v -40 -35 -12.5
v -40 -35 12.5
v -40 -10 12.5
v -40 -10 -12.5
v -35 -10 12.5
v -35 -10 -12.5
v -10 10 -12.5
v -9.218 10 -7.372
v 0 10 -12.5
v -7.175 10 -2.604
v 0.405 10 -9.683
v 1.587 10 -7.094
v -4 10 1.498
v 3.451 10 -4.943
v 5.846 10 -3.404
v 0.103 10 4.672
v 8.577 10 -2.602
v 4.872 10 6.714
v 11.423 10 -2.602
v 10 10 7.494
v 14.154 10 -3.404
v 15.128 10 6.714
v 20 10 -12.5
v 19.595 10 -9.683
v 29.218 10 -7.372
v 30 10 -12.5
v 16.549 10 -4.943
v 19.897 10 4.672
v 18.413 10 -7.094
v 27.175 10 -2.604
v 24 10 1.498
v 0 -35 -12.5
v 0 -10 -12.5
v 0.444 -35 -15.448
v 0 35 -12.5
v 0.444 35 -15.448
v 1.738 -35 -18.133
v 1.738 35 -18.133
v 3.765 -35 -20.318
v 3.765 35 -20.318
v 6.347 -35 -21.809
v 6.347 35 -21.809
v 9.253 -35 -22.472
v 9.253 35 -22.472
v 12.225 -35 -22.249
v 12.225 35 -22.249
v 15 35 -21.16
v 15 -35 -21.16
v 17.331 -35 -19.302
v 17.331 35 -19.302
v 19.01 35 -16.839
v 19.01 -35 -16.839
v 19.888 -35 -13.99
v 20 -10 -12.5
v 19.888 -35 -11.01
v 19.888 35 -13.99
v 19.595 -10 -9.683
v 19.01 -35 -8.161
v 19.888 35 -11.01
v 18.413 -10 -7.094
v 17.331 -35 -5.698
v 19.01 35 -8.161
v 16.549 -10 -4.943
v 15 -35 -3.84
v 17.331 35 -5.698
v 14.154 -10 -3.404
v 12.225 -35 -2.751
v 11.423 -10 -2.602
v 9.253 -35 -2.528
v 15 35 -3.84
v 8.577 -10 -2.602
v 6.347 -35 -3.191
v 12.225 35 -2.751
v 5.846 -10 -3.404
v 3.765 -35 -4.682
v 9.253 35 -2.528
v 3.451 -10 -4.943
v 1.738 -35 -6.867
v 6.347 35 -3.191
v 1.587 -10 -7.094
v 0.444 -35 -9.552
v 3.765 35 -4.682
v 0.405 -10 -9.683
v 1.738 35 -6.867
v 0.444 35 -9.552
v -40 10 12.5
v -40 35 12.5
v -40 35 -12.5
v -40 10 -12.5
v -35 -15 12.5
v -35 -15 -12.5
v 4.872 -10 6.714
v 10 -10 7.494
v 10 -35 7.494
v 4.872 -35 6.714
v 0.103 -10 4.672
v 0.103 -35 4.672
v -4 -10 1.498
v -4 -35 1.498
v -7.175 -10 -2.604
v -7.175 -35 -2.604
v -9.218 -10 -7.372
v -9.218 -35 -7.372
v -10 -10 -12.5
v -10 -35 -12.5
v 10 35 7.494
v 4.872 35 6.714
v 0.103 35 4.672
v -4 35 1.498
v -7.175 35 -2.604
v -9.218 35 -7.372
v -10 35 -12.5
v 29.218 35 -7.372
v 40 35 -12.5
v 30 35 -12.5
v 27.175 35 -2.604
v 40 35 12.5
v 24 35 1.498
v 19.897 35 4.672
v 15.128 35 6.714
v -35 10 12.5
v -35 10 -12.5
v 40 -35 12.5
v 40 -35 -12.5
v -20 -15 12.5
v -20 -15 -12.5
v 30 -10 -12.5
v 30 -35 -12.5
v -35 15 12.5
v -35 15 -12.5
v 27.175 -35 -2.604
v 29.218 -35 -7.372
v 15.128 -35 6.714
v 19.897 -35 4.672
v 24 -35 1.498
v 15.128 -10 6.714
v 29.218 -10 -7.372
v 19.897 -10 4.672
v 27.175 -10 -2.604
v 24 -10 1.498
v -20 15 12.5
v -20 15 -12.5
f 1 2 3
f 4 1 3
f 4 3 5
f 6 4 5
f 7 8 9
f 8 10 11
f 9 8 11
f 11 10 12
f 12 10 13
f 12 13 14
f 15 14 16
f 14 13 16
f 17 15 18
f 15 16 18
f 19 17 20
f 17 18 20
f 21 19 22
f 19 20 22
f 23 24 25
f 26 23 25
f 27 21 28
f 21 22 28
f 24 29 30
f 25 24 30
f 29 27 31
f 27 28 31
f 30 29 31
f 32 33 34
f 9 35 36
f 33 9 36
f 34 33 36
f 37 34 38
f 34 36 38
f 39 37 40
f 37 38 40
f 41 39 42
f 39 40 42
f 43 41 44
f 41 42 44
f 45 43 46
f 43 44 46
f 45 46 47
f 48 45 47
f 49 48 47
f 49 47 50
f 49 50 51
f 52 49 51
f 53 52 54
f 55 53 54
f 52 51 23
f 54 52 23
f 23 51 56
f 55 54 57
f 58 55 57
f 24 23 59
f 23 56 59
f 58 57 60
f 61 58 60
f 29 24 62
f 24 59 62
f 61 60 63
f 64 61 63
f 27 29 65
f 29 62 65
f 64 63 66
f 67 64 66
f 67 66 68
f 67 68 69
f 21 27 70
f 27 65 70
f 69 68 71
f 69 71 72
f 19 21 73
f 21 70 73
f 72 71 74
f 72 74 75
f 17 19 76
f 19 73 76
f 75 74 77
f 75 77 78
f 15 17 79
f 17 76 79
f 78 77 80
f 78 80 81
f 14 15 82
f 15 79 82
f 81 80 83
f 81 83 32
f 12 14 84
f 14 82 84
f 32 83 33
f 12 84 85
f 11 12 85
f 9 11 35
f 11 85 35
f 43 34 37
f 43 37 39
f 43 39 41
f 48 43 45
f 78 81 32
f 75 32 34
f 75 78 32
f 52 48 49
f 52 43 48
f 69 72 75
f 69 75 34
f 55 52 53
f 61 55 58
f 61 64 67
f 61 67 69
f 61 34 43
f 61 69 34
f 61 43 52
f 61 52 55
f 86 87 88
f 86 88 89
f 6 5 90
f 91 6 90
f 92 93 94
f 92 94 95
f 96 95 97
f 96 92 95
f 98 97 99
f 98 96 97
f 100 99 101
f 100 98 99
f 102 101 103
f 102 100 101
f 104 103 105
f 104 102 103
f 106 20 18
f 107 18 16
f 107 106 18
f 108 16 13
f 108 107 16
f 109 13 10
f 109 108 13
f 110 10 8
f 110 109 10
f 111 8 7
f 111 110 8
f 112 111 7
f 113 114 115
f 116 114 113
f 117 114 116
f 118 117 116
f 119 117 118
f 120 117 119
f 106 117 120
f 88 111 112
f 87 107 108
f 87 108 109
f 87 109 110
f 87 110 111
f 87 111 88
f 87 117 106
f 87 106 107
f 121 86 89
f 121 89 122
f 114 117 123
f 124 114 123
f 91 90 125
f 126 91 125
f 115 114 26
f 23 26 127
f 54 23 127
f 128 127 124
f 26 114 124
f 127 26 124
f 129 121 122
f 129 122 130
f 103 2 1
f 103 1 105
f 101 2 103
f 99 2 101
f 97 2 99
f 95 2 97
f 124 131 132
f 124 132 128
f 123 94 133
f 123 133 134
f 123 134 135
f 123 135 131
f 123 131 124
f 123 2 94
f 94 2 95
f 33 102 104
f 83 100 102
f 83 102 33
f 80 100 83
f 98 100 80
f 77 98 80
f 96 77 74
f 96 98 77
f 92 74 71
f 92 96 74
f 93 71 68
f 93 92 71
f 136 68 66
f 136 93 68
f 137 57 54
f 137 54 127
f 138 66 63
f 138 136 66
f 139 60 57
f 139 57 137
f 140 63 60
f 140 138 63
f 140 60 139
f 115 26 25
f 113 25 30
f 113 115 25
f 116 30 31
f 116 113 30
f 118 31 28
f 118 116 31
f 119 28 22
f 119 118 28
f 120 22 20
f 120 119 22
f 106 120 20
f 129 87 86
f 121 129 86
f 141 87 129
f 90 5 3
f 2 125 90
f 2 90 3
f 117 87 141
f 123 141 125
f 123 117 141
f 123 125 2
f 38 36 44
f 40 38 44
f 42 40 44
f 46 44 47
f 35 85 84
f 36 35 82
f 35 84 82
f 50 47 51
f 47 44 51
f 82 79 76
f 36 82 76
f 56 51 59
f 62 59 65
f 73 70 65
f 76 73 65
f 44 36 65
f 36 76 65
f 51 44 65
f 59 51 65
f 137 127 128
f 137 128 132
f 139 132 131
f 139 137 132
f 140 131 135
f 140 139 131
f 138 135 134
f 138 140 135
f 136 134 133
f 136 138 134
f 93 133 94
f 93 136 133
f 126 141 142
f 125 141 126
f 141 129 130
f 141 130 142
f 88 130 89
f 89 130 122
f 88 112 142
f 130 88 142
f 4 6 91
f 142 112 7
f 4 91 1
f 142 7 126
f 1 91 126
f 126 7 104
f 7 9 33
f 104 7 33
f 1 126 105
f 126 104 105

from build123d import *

# Parameters (mm, degrees)
F0_W          = 70
F0_H          = 25
F1_DEPTH      = 40
F1_DEPTH_BACK = 40
F3_DEPTH      = 40
F4_W          = 40
F4_H          = 20
F5_DEPTH      = 25
F7_DEPTH      = 25
F8_W          = 80
F8_H          = 25
F9_DEPTH      = 35
F11_DEPTH     = 25
F12_T4_DEPTH  = 76.2347538298
F12_T9_DEPTH  = 76.2347538298
F12_T14_DEPTH = 76.2347538298
F12_T19_DEPTH = 76.2347538298


# Not quite as in the source:
# - a fillet or chamfer that OpenCascade refuses, or shapes differently, is made with other operations: its cross-section is extruded or revolved along the edge and cut away or added


with BuildPart() as f1:
    # F0 (on Right) → F1 (new body, two sides)
    with BuildSketch(Plane.YZ) as f1_sk:
        Rectangle(F0_W, F0_H)
    extrude(amount=F1_DEPTH)
    extrude(f1_sk.sketch, amount=-F1_DEPTH_BACK)

    # F2 (on face) → F3 (cut)
    with BuildSketch(Plane.XY.offset(12.5)):
        Polygon((-40, 10), (-40, 0), (-20, 0), (-20, 15), (-35, 15), (-35, 10), align=None)
        Polygon((-20, 0), (-40, 0), (-40, -10), (-35, -10), (-35, -15), (-20, -15), align=None)
    extrude(amount=-F3_DEPTH, mode=Mode.SUBTRACT)

    # F4 (on face) → F5 (cut)
    with BuildSketch(Plane.XZ.offset(35)):
        with Locations((10, -2.5)):
            Rectangle(F4_W, F4_H)
    extrude(amount=-F5_DEPTH, mode=Mode.SUBTRACT)

    # F6 (on face) → F7 (join)
    with BuildSketch(Plane.XZ.offset(10)):
        with BuildLine():
            Line((0, -12.5), (20, -12.5))
            ThreePointArc((20, -12.5), (10, -2.5), (0, -12.5))
        make_face()
        with BuildLine():
            ThreePointArc((0, -12.5), (10, -22.5), (20, -12.5))
            Line((20, -12.5), (0, -12.5))
        make_face()
    extrude(amount=F7_DEPTH)

    # F8 (on face) → F9 (cut)
    with BuildSketch(Plane(origin=(0, 35, 0), x_dir=(-1, 0, 0), z_dir=(0, 1, 0))):
        Rectangle(F8_W, F8_H)
    extrude(amount=-F9_DEPTH, mode=Mode.SUBTRACT)

    # F10: F1 across plane


with BuildPart() as f1_1:
    add(f1.part)
    add(f1.part.mirror(Plane.XZ))

    # F11 (add): a face of the model
    f11_faces = [f1_1.faces().sort_by_distance(p)[0] for p in [
        (10, -10, -16.7441318158),
    ]]
    extrude(f11_faces, amount=F11_DEPTH)

    # F12: fillet of radius 20.5 on 4 edges, made by hand


with BuildPart() as f12_tool2:
    # F12_s3 → F12_t4 (new body)
    with BuildSketch(Plane.XZ.offset(-35)):
        with BuildLine():
            ThreePointArc((30, -12.5), (23.8239195314, 1.6714007511), (9.5060984681, 7.5))
            Line((9.5060984681, 7.5), (30, 7.5))
            Line((30, 7.5), (30, -12.5))
        make_face()
    extrude(amount=F12_T4_DEPTH)

    split(bisect_by=Plane.XZ.offset(35), keep=Keep.BOTTOM)


with BuildPart() as f1_2:
    add(f1_1.part)

    # F12_t1: union F12_tool2
    add(f12_tool2.part)


with BuildPart() as f12_tool7:
    # F12_s8 → F12_t9 (new body)
    with BuildSketch(Plane.XZ.offset(-35)):
        with BuildLine():
            ThreePointArc((10.4939015319, 7.5), (-3.8239195314, 1.6714007511), (-10, -12.5))
            Line((-10, -12.5), (-10, 7.5))
            Line((-10, 7.5), (10.4939015319, 7.5))
        make_face()
    extrude(amount=F12_T9_DEPTH)

    split(bisect_by=Plane.XZ.offset(35), keep=Keep.BOTTOM)


with BuildPart() as f1_3:
    add(f1_2.part)

    # F12_t6: union F12_tool7
    add(f12_tool7.part)


with BuildPart() as f12_tool12:
    # F12_s13 → F12_t14 (new body)
    with BuildSketch(Plane.XZ.offset(35)):
        with BuildLine():
            ThreePointArc((30, -12.5), (23.8239195314, 1.6714007511), (9.5060984681, 7.5))
            Line((9.5060984681, 7.5), (30, 7.5))
            Line((30, 7.5), (30, -12.5))
        make_face()
    extrude(amount=-F12_T14_DEPTH)

    split(bisect_by=Plane.XZ.offset(-35), keep=Keep.TOP)


with BuildPart() as f1_4:
    add(f1_3.part)

    # F12_t11: union F12_tool12
    add(f12_tool12.part)


with BuildPart() as f12_tool17:
    # F12_s18 → F12_t19 (new body)
    with BuildSketch(Plane.XZ.offset(35)):
        with BuildLine():
            ThreePointArc((-10, -12.5), (-3.8239195314, 1.6714007511), (10.4939015319, 7.5))
            Line((10.4939015319, 7.5), (-10, 7.5))
            Line((-10, 7.5), (-10, -12.5))
        make_face()
    extrude(amount=-F12_T19_DEPTH)

    split(bisect_by=Plane.XZ.offset(-35), keep=Keep.TOP)


with BuildPart() as f1_5:
    add(f1_4.part)

    # F12_t16: union F12_tool17
    add(f12_tool17.part)


solid = f1_5.part
